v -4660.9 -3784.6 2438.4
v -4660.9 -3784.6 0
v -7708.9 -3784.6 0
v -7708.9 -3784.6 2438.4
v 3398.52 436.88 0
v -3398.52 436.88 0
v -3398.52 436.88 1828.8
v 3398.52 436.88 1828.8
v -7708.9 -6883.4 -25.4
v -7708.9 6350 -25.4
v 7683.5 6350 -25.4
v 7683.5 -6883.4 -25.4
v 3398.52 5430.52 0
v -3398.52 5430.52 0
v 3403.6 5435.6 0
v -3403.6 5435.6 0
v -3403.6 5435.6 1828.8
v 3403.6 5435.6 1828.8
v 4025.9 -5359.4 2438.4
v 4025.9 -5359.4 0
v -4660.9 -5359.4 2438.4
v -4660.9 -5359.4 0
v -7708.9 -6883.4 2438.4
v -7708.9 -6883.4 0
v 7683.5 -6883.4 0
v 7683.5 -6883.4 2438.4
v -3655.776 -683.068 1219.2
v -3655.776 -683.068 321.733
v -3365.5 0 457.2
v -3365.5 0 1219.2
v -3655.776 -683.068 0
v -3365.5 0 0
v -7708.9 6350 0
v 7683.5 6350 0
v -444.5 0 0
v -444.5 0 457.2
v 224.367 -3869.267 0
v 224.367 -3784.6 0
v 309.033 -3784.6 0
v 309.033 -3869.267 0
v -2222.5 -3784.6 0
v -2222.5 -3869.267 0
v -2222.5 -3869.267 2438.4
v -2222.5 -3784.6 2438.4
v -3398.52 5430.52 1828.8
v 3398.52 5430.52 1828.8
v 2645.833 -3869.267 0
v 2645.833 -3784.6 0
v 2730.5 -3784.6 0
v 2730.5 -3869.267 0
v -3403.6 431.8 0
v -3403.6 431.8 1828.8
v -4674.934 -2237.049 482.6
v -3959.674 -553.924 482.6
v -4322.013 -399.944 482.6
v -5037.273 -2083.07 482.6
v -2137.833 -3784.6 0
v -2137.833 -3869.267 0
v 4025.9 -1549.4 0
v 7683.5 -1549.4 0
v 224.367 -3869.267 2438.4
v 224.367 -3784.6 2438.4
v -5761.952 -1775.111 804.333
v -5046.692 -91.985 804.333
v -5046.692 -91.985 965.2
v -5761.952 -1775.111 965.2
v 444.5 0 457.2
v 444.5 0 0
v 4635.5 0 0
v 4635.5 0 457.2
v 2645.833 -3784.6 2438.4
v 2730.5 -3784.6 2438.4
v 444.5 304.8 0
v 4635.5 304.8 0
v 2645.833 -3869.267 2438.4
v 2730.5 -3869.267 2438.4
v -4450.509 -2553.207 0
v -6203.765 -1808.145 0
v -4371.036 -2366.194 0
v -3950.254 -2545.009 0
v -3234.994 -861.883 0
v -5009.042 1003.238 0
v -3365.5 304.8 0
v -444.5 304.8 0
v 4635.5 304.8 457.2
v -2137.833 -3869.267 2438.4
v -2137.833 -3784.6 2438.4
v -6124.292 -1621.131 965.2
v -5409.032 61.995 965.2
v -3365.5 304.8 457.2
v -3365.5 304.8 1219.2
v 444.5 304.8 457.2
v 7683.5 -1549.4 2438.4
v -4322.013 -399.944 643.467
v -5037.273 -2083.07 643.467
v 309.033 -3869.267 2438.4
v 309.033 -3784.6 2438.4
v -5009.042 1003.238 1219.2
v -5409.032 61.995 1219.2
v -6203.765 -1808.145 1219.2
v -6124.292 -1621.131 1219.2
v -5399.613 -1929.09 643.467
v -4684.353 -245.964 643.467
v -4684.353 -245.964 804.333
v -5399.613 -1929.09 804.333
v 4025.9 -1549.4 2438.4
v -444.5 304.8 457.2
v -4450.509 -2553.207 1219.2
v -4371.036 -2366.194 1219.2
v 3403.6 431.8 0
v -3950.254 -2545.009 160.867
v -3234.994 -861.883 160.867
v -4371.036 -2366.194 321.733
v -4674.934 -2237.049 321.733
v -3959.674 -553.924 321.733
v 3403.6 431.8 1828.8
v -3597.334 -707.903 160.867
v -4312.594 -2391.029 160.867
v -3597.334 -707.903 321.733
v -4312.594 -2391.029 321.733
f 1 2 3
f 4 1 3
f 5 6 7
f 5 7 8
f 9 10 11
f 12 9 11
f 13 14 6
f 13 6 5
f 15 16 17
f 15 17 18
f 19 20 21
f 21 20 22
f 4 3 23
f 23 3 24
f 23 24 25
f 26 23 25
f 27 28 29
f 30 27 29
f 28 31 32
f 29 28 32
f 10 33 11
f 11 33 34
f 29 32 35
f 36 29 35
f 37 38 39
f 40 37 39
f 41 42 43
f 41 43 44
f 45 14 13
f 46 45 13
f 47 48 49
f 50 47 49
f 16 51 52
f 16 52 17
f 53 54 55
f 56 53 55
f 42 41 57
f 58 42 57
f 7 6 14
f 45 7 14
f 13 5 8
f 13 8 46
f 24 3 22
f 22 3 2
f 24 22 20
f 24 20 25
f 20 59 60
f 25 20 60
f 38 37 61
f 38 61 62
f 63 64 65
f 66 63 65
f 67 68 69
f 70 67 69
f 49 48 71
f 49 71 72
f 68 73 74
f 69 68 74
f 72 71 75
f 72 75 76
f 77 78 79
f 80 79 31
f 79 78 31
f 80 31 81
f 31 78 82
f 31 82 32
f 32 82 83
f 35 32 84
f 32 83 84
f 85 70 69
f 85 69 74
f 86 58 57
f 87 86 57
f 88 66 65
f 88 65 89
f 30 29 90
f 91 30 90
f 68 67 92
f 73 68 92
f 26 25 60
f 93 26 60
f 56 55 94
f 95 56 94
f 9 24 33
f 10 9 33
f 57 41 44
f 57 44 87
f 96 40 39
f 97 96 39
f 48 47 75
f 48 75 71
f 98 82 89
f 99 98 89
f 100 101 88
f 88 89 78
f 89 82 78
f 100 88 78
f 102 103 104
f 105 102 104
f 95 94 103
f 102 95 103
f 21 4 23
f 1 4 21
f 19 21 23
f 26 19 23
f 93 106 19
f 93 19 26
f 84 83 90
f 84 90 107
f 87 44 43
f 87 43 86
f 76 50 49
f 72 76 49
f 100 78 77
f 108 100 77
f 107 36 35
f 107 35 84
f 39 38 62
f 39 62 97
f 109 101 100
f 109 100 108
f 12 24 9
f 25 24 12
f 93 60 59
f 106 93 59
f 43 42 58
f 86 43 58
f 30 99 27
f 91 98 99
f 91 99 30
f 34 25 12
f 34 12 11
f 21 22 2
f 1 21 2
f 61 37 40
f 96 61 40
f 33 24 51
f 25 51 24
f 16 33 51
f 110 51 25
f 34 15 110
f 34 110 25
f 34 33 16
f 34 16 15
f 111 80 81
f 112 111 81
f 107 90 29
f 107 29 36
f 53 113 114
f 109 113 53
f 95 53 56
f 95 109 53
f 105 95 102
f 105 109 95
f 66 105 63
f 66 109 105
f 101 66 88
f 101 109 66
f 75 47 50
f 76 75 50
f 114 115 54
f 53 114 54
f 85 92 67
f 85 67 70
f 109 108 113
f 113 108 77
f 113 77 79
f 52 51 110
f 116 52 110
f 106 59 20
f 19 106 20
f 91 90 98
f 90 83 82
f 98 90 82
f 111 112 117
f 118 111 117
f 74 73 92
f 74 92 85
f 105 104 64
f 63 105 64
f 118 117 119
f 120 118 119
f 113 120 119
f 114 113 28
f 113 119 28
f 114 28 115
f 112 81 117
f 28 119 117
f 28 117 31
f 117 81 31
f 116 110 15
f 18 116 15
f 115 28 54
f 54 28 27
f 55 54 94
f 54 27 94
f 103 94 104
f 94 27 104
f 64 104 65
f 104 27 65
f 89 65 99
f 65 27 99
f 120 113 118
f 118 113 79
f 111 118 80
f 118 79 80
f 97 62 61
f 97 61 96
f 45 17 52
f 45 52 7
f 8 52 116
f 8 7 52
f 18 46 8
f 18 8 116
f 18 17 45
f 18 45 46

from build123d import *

# Parameters (mm, degrees)
F0_W      = 4191
F0_H      = 304.8
F1_DEPTH  = 457.2
F0_W_2    = 2921
F3_DEPTH  = 2438.4
F2_W      = 84.6666666667
F2_H      = 84.6666666667
F5_DEPTH  = 1219.2
F7_DEPTH  = 1828.8
F8_W      = 15392.4
F8_H      = 13233.4
F9_DEPTH  = 25.4
F10_W     = 6807.2
F10_H     = 5003.8
F10_W_2   = 6797.04
F10_H_2   = 4993.64
F11_DEPTH = 1828.8


with BuildPart() as f1:
    # F0 (on Top) → F1 (new body)
    with BuildSketch(Plane.XY):
        with Locations((2540, 152.4)):
            Rectangle(F0_W, F0_H)
    extrude(amount=F1_DEPTH)


with BuildPart() as f1b:
    # F0 (on Top) → F1, piece 2 (new body)
    with BuildSketch(Plane.XY):
        with Locations((-1905, 152.4)):
            Rectangle(F0_W_2, F0_H)
    extrude(amount=F1_DEPTH)

    # F4 (on Top) → F5 (join)
    with BuildSketch(Plane.XY):
        Polygon((-3655.7759595183, -683.0676722074), (-3365.5, 0), (-3365.5, 304.8), (-5009.0418331298, 1003.2383861683), (-6203.7653557771, -1808.1450191275), (-4660.9, -2463.8), (-4450.5092696668, -2553.2074973917), (-4371.0359386519, -2366.1935148733), (-3950.2544779854, -2545.0085096567), (-3234.9944988518, -861.8826669908), align=None)
    extrude(amount=F5_DEPTH)

    # F6 (on face) → F7 (cut)
    with BuildSketch(Plane(origin=(-805.0836430775, -1894.4958822004, 0), x_dir=(-0.9203444022, 0.3911089125, 0), z_dir=(0.3911089125, 0.9203444022, 0))):
        Polygon((2640.2190854615, 1219.2), (2640.2190854615, 160.8666666667), (3033.9190854615, 160.8666666667), (3033.9190854615, 321.7333333333), (3427.6190854615, 321.7333333333), (3427.6190854615, 482.6), (3821.3190854615, 482.6), (3821.3190854615, 643.4666666667), (4215.0190854615, 643.4666666667), (4215.0190854615, 804.3333333333), (4608.7190854615, 804.3333333333), (4608.7190854615, 965.2), (5002.4190854615, 965.2), (5002.4190854615, 1219.2), align=None)
    extrude(amount=-F7_DEPTH, mode=Mode.SUBTRACT)


with BuildPart() as f3:
    # F2 (on Top) → F3 (new body)
    with BuildSketch(Plane.XY):
        Polygon((4635.5, -1549.4), (4025.9, -1549.4), (4025.9, -5359.4), (-4660.9, -5359.4), (-4660.9, -3784.6), (-7708.9, -3784.6), (-7708.9, -6883.4), (4635.5, -6883.4), (7683.5, -6883.4), (7683.5, -1549.4), align=None)
    extrude(amount=F3_DEPTH)


with BuildPart() as f3b:
    # F2 (on Top) → F3, piece 2 (new body)
    with BuildSketch(Plane.XY):
        with Locations((-2180.1666666667, -3826.9333333333)):
            Rectangle(F2_W, F2_H)
    extrude(amount=F3_DEPTH)


with BuildPart() as f3c:
    # F2 (on Top) → F3, piece 3 (new body)
    with BuildSketch(Plane.XY):
        with Locations((266.7, -3826.9333333333)):
            Rectangle(F2_W, F2_H)
    extrude(amount=F3_DEPTH)


with BuildPart() as f3d:
    # F2 (on Top) → F3, piece 4 (new body)
    with BuildSketch(Plane.XY):
        with Locations((2688.1666666667, -3826.9333333333)):
            Rectangle(F2_W, F2_H)
    extrude(amount=F3_DEPTH)


with BuildPart() as f9:
    # F8 (on Top) → F9 (new body)
    with BuildSketch(Plane.XY):
        with Locations((-12.7, -266.7)):
            Rectangle(F8_W, F8_H)
    extrude(amount=-F9_DEPTH)

    # F10 (on Top) → F11 (join)
    with BuildSketch(Plane.XY):
        with Locations((0, 2933.7)):
            Rectangle(F10_W, F10_H)
        with Locations((0, 2933.7)):
            Rectangle(F10_W_2, F10_H_2, mode=Mode.SUBTRACT)
    extrude(amount=F11_DEPTH)


solid = Compound([f1.part, f1b.part, f3.part, f3b.part, f3c.part, f3d.part, f9.part])
